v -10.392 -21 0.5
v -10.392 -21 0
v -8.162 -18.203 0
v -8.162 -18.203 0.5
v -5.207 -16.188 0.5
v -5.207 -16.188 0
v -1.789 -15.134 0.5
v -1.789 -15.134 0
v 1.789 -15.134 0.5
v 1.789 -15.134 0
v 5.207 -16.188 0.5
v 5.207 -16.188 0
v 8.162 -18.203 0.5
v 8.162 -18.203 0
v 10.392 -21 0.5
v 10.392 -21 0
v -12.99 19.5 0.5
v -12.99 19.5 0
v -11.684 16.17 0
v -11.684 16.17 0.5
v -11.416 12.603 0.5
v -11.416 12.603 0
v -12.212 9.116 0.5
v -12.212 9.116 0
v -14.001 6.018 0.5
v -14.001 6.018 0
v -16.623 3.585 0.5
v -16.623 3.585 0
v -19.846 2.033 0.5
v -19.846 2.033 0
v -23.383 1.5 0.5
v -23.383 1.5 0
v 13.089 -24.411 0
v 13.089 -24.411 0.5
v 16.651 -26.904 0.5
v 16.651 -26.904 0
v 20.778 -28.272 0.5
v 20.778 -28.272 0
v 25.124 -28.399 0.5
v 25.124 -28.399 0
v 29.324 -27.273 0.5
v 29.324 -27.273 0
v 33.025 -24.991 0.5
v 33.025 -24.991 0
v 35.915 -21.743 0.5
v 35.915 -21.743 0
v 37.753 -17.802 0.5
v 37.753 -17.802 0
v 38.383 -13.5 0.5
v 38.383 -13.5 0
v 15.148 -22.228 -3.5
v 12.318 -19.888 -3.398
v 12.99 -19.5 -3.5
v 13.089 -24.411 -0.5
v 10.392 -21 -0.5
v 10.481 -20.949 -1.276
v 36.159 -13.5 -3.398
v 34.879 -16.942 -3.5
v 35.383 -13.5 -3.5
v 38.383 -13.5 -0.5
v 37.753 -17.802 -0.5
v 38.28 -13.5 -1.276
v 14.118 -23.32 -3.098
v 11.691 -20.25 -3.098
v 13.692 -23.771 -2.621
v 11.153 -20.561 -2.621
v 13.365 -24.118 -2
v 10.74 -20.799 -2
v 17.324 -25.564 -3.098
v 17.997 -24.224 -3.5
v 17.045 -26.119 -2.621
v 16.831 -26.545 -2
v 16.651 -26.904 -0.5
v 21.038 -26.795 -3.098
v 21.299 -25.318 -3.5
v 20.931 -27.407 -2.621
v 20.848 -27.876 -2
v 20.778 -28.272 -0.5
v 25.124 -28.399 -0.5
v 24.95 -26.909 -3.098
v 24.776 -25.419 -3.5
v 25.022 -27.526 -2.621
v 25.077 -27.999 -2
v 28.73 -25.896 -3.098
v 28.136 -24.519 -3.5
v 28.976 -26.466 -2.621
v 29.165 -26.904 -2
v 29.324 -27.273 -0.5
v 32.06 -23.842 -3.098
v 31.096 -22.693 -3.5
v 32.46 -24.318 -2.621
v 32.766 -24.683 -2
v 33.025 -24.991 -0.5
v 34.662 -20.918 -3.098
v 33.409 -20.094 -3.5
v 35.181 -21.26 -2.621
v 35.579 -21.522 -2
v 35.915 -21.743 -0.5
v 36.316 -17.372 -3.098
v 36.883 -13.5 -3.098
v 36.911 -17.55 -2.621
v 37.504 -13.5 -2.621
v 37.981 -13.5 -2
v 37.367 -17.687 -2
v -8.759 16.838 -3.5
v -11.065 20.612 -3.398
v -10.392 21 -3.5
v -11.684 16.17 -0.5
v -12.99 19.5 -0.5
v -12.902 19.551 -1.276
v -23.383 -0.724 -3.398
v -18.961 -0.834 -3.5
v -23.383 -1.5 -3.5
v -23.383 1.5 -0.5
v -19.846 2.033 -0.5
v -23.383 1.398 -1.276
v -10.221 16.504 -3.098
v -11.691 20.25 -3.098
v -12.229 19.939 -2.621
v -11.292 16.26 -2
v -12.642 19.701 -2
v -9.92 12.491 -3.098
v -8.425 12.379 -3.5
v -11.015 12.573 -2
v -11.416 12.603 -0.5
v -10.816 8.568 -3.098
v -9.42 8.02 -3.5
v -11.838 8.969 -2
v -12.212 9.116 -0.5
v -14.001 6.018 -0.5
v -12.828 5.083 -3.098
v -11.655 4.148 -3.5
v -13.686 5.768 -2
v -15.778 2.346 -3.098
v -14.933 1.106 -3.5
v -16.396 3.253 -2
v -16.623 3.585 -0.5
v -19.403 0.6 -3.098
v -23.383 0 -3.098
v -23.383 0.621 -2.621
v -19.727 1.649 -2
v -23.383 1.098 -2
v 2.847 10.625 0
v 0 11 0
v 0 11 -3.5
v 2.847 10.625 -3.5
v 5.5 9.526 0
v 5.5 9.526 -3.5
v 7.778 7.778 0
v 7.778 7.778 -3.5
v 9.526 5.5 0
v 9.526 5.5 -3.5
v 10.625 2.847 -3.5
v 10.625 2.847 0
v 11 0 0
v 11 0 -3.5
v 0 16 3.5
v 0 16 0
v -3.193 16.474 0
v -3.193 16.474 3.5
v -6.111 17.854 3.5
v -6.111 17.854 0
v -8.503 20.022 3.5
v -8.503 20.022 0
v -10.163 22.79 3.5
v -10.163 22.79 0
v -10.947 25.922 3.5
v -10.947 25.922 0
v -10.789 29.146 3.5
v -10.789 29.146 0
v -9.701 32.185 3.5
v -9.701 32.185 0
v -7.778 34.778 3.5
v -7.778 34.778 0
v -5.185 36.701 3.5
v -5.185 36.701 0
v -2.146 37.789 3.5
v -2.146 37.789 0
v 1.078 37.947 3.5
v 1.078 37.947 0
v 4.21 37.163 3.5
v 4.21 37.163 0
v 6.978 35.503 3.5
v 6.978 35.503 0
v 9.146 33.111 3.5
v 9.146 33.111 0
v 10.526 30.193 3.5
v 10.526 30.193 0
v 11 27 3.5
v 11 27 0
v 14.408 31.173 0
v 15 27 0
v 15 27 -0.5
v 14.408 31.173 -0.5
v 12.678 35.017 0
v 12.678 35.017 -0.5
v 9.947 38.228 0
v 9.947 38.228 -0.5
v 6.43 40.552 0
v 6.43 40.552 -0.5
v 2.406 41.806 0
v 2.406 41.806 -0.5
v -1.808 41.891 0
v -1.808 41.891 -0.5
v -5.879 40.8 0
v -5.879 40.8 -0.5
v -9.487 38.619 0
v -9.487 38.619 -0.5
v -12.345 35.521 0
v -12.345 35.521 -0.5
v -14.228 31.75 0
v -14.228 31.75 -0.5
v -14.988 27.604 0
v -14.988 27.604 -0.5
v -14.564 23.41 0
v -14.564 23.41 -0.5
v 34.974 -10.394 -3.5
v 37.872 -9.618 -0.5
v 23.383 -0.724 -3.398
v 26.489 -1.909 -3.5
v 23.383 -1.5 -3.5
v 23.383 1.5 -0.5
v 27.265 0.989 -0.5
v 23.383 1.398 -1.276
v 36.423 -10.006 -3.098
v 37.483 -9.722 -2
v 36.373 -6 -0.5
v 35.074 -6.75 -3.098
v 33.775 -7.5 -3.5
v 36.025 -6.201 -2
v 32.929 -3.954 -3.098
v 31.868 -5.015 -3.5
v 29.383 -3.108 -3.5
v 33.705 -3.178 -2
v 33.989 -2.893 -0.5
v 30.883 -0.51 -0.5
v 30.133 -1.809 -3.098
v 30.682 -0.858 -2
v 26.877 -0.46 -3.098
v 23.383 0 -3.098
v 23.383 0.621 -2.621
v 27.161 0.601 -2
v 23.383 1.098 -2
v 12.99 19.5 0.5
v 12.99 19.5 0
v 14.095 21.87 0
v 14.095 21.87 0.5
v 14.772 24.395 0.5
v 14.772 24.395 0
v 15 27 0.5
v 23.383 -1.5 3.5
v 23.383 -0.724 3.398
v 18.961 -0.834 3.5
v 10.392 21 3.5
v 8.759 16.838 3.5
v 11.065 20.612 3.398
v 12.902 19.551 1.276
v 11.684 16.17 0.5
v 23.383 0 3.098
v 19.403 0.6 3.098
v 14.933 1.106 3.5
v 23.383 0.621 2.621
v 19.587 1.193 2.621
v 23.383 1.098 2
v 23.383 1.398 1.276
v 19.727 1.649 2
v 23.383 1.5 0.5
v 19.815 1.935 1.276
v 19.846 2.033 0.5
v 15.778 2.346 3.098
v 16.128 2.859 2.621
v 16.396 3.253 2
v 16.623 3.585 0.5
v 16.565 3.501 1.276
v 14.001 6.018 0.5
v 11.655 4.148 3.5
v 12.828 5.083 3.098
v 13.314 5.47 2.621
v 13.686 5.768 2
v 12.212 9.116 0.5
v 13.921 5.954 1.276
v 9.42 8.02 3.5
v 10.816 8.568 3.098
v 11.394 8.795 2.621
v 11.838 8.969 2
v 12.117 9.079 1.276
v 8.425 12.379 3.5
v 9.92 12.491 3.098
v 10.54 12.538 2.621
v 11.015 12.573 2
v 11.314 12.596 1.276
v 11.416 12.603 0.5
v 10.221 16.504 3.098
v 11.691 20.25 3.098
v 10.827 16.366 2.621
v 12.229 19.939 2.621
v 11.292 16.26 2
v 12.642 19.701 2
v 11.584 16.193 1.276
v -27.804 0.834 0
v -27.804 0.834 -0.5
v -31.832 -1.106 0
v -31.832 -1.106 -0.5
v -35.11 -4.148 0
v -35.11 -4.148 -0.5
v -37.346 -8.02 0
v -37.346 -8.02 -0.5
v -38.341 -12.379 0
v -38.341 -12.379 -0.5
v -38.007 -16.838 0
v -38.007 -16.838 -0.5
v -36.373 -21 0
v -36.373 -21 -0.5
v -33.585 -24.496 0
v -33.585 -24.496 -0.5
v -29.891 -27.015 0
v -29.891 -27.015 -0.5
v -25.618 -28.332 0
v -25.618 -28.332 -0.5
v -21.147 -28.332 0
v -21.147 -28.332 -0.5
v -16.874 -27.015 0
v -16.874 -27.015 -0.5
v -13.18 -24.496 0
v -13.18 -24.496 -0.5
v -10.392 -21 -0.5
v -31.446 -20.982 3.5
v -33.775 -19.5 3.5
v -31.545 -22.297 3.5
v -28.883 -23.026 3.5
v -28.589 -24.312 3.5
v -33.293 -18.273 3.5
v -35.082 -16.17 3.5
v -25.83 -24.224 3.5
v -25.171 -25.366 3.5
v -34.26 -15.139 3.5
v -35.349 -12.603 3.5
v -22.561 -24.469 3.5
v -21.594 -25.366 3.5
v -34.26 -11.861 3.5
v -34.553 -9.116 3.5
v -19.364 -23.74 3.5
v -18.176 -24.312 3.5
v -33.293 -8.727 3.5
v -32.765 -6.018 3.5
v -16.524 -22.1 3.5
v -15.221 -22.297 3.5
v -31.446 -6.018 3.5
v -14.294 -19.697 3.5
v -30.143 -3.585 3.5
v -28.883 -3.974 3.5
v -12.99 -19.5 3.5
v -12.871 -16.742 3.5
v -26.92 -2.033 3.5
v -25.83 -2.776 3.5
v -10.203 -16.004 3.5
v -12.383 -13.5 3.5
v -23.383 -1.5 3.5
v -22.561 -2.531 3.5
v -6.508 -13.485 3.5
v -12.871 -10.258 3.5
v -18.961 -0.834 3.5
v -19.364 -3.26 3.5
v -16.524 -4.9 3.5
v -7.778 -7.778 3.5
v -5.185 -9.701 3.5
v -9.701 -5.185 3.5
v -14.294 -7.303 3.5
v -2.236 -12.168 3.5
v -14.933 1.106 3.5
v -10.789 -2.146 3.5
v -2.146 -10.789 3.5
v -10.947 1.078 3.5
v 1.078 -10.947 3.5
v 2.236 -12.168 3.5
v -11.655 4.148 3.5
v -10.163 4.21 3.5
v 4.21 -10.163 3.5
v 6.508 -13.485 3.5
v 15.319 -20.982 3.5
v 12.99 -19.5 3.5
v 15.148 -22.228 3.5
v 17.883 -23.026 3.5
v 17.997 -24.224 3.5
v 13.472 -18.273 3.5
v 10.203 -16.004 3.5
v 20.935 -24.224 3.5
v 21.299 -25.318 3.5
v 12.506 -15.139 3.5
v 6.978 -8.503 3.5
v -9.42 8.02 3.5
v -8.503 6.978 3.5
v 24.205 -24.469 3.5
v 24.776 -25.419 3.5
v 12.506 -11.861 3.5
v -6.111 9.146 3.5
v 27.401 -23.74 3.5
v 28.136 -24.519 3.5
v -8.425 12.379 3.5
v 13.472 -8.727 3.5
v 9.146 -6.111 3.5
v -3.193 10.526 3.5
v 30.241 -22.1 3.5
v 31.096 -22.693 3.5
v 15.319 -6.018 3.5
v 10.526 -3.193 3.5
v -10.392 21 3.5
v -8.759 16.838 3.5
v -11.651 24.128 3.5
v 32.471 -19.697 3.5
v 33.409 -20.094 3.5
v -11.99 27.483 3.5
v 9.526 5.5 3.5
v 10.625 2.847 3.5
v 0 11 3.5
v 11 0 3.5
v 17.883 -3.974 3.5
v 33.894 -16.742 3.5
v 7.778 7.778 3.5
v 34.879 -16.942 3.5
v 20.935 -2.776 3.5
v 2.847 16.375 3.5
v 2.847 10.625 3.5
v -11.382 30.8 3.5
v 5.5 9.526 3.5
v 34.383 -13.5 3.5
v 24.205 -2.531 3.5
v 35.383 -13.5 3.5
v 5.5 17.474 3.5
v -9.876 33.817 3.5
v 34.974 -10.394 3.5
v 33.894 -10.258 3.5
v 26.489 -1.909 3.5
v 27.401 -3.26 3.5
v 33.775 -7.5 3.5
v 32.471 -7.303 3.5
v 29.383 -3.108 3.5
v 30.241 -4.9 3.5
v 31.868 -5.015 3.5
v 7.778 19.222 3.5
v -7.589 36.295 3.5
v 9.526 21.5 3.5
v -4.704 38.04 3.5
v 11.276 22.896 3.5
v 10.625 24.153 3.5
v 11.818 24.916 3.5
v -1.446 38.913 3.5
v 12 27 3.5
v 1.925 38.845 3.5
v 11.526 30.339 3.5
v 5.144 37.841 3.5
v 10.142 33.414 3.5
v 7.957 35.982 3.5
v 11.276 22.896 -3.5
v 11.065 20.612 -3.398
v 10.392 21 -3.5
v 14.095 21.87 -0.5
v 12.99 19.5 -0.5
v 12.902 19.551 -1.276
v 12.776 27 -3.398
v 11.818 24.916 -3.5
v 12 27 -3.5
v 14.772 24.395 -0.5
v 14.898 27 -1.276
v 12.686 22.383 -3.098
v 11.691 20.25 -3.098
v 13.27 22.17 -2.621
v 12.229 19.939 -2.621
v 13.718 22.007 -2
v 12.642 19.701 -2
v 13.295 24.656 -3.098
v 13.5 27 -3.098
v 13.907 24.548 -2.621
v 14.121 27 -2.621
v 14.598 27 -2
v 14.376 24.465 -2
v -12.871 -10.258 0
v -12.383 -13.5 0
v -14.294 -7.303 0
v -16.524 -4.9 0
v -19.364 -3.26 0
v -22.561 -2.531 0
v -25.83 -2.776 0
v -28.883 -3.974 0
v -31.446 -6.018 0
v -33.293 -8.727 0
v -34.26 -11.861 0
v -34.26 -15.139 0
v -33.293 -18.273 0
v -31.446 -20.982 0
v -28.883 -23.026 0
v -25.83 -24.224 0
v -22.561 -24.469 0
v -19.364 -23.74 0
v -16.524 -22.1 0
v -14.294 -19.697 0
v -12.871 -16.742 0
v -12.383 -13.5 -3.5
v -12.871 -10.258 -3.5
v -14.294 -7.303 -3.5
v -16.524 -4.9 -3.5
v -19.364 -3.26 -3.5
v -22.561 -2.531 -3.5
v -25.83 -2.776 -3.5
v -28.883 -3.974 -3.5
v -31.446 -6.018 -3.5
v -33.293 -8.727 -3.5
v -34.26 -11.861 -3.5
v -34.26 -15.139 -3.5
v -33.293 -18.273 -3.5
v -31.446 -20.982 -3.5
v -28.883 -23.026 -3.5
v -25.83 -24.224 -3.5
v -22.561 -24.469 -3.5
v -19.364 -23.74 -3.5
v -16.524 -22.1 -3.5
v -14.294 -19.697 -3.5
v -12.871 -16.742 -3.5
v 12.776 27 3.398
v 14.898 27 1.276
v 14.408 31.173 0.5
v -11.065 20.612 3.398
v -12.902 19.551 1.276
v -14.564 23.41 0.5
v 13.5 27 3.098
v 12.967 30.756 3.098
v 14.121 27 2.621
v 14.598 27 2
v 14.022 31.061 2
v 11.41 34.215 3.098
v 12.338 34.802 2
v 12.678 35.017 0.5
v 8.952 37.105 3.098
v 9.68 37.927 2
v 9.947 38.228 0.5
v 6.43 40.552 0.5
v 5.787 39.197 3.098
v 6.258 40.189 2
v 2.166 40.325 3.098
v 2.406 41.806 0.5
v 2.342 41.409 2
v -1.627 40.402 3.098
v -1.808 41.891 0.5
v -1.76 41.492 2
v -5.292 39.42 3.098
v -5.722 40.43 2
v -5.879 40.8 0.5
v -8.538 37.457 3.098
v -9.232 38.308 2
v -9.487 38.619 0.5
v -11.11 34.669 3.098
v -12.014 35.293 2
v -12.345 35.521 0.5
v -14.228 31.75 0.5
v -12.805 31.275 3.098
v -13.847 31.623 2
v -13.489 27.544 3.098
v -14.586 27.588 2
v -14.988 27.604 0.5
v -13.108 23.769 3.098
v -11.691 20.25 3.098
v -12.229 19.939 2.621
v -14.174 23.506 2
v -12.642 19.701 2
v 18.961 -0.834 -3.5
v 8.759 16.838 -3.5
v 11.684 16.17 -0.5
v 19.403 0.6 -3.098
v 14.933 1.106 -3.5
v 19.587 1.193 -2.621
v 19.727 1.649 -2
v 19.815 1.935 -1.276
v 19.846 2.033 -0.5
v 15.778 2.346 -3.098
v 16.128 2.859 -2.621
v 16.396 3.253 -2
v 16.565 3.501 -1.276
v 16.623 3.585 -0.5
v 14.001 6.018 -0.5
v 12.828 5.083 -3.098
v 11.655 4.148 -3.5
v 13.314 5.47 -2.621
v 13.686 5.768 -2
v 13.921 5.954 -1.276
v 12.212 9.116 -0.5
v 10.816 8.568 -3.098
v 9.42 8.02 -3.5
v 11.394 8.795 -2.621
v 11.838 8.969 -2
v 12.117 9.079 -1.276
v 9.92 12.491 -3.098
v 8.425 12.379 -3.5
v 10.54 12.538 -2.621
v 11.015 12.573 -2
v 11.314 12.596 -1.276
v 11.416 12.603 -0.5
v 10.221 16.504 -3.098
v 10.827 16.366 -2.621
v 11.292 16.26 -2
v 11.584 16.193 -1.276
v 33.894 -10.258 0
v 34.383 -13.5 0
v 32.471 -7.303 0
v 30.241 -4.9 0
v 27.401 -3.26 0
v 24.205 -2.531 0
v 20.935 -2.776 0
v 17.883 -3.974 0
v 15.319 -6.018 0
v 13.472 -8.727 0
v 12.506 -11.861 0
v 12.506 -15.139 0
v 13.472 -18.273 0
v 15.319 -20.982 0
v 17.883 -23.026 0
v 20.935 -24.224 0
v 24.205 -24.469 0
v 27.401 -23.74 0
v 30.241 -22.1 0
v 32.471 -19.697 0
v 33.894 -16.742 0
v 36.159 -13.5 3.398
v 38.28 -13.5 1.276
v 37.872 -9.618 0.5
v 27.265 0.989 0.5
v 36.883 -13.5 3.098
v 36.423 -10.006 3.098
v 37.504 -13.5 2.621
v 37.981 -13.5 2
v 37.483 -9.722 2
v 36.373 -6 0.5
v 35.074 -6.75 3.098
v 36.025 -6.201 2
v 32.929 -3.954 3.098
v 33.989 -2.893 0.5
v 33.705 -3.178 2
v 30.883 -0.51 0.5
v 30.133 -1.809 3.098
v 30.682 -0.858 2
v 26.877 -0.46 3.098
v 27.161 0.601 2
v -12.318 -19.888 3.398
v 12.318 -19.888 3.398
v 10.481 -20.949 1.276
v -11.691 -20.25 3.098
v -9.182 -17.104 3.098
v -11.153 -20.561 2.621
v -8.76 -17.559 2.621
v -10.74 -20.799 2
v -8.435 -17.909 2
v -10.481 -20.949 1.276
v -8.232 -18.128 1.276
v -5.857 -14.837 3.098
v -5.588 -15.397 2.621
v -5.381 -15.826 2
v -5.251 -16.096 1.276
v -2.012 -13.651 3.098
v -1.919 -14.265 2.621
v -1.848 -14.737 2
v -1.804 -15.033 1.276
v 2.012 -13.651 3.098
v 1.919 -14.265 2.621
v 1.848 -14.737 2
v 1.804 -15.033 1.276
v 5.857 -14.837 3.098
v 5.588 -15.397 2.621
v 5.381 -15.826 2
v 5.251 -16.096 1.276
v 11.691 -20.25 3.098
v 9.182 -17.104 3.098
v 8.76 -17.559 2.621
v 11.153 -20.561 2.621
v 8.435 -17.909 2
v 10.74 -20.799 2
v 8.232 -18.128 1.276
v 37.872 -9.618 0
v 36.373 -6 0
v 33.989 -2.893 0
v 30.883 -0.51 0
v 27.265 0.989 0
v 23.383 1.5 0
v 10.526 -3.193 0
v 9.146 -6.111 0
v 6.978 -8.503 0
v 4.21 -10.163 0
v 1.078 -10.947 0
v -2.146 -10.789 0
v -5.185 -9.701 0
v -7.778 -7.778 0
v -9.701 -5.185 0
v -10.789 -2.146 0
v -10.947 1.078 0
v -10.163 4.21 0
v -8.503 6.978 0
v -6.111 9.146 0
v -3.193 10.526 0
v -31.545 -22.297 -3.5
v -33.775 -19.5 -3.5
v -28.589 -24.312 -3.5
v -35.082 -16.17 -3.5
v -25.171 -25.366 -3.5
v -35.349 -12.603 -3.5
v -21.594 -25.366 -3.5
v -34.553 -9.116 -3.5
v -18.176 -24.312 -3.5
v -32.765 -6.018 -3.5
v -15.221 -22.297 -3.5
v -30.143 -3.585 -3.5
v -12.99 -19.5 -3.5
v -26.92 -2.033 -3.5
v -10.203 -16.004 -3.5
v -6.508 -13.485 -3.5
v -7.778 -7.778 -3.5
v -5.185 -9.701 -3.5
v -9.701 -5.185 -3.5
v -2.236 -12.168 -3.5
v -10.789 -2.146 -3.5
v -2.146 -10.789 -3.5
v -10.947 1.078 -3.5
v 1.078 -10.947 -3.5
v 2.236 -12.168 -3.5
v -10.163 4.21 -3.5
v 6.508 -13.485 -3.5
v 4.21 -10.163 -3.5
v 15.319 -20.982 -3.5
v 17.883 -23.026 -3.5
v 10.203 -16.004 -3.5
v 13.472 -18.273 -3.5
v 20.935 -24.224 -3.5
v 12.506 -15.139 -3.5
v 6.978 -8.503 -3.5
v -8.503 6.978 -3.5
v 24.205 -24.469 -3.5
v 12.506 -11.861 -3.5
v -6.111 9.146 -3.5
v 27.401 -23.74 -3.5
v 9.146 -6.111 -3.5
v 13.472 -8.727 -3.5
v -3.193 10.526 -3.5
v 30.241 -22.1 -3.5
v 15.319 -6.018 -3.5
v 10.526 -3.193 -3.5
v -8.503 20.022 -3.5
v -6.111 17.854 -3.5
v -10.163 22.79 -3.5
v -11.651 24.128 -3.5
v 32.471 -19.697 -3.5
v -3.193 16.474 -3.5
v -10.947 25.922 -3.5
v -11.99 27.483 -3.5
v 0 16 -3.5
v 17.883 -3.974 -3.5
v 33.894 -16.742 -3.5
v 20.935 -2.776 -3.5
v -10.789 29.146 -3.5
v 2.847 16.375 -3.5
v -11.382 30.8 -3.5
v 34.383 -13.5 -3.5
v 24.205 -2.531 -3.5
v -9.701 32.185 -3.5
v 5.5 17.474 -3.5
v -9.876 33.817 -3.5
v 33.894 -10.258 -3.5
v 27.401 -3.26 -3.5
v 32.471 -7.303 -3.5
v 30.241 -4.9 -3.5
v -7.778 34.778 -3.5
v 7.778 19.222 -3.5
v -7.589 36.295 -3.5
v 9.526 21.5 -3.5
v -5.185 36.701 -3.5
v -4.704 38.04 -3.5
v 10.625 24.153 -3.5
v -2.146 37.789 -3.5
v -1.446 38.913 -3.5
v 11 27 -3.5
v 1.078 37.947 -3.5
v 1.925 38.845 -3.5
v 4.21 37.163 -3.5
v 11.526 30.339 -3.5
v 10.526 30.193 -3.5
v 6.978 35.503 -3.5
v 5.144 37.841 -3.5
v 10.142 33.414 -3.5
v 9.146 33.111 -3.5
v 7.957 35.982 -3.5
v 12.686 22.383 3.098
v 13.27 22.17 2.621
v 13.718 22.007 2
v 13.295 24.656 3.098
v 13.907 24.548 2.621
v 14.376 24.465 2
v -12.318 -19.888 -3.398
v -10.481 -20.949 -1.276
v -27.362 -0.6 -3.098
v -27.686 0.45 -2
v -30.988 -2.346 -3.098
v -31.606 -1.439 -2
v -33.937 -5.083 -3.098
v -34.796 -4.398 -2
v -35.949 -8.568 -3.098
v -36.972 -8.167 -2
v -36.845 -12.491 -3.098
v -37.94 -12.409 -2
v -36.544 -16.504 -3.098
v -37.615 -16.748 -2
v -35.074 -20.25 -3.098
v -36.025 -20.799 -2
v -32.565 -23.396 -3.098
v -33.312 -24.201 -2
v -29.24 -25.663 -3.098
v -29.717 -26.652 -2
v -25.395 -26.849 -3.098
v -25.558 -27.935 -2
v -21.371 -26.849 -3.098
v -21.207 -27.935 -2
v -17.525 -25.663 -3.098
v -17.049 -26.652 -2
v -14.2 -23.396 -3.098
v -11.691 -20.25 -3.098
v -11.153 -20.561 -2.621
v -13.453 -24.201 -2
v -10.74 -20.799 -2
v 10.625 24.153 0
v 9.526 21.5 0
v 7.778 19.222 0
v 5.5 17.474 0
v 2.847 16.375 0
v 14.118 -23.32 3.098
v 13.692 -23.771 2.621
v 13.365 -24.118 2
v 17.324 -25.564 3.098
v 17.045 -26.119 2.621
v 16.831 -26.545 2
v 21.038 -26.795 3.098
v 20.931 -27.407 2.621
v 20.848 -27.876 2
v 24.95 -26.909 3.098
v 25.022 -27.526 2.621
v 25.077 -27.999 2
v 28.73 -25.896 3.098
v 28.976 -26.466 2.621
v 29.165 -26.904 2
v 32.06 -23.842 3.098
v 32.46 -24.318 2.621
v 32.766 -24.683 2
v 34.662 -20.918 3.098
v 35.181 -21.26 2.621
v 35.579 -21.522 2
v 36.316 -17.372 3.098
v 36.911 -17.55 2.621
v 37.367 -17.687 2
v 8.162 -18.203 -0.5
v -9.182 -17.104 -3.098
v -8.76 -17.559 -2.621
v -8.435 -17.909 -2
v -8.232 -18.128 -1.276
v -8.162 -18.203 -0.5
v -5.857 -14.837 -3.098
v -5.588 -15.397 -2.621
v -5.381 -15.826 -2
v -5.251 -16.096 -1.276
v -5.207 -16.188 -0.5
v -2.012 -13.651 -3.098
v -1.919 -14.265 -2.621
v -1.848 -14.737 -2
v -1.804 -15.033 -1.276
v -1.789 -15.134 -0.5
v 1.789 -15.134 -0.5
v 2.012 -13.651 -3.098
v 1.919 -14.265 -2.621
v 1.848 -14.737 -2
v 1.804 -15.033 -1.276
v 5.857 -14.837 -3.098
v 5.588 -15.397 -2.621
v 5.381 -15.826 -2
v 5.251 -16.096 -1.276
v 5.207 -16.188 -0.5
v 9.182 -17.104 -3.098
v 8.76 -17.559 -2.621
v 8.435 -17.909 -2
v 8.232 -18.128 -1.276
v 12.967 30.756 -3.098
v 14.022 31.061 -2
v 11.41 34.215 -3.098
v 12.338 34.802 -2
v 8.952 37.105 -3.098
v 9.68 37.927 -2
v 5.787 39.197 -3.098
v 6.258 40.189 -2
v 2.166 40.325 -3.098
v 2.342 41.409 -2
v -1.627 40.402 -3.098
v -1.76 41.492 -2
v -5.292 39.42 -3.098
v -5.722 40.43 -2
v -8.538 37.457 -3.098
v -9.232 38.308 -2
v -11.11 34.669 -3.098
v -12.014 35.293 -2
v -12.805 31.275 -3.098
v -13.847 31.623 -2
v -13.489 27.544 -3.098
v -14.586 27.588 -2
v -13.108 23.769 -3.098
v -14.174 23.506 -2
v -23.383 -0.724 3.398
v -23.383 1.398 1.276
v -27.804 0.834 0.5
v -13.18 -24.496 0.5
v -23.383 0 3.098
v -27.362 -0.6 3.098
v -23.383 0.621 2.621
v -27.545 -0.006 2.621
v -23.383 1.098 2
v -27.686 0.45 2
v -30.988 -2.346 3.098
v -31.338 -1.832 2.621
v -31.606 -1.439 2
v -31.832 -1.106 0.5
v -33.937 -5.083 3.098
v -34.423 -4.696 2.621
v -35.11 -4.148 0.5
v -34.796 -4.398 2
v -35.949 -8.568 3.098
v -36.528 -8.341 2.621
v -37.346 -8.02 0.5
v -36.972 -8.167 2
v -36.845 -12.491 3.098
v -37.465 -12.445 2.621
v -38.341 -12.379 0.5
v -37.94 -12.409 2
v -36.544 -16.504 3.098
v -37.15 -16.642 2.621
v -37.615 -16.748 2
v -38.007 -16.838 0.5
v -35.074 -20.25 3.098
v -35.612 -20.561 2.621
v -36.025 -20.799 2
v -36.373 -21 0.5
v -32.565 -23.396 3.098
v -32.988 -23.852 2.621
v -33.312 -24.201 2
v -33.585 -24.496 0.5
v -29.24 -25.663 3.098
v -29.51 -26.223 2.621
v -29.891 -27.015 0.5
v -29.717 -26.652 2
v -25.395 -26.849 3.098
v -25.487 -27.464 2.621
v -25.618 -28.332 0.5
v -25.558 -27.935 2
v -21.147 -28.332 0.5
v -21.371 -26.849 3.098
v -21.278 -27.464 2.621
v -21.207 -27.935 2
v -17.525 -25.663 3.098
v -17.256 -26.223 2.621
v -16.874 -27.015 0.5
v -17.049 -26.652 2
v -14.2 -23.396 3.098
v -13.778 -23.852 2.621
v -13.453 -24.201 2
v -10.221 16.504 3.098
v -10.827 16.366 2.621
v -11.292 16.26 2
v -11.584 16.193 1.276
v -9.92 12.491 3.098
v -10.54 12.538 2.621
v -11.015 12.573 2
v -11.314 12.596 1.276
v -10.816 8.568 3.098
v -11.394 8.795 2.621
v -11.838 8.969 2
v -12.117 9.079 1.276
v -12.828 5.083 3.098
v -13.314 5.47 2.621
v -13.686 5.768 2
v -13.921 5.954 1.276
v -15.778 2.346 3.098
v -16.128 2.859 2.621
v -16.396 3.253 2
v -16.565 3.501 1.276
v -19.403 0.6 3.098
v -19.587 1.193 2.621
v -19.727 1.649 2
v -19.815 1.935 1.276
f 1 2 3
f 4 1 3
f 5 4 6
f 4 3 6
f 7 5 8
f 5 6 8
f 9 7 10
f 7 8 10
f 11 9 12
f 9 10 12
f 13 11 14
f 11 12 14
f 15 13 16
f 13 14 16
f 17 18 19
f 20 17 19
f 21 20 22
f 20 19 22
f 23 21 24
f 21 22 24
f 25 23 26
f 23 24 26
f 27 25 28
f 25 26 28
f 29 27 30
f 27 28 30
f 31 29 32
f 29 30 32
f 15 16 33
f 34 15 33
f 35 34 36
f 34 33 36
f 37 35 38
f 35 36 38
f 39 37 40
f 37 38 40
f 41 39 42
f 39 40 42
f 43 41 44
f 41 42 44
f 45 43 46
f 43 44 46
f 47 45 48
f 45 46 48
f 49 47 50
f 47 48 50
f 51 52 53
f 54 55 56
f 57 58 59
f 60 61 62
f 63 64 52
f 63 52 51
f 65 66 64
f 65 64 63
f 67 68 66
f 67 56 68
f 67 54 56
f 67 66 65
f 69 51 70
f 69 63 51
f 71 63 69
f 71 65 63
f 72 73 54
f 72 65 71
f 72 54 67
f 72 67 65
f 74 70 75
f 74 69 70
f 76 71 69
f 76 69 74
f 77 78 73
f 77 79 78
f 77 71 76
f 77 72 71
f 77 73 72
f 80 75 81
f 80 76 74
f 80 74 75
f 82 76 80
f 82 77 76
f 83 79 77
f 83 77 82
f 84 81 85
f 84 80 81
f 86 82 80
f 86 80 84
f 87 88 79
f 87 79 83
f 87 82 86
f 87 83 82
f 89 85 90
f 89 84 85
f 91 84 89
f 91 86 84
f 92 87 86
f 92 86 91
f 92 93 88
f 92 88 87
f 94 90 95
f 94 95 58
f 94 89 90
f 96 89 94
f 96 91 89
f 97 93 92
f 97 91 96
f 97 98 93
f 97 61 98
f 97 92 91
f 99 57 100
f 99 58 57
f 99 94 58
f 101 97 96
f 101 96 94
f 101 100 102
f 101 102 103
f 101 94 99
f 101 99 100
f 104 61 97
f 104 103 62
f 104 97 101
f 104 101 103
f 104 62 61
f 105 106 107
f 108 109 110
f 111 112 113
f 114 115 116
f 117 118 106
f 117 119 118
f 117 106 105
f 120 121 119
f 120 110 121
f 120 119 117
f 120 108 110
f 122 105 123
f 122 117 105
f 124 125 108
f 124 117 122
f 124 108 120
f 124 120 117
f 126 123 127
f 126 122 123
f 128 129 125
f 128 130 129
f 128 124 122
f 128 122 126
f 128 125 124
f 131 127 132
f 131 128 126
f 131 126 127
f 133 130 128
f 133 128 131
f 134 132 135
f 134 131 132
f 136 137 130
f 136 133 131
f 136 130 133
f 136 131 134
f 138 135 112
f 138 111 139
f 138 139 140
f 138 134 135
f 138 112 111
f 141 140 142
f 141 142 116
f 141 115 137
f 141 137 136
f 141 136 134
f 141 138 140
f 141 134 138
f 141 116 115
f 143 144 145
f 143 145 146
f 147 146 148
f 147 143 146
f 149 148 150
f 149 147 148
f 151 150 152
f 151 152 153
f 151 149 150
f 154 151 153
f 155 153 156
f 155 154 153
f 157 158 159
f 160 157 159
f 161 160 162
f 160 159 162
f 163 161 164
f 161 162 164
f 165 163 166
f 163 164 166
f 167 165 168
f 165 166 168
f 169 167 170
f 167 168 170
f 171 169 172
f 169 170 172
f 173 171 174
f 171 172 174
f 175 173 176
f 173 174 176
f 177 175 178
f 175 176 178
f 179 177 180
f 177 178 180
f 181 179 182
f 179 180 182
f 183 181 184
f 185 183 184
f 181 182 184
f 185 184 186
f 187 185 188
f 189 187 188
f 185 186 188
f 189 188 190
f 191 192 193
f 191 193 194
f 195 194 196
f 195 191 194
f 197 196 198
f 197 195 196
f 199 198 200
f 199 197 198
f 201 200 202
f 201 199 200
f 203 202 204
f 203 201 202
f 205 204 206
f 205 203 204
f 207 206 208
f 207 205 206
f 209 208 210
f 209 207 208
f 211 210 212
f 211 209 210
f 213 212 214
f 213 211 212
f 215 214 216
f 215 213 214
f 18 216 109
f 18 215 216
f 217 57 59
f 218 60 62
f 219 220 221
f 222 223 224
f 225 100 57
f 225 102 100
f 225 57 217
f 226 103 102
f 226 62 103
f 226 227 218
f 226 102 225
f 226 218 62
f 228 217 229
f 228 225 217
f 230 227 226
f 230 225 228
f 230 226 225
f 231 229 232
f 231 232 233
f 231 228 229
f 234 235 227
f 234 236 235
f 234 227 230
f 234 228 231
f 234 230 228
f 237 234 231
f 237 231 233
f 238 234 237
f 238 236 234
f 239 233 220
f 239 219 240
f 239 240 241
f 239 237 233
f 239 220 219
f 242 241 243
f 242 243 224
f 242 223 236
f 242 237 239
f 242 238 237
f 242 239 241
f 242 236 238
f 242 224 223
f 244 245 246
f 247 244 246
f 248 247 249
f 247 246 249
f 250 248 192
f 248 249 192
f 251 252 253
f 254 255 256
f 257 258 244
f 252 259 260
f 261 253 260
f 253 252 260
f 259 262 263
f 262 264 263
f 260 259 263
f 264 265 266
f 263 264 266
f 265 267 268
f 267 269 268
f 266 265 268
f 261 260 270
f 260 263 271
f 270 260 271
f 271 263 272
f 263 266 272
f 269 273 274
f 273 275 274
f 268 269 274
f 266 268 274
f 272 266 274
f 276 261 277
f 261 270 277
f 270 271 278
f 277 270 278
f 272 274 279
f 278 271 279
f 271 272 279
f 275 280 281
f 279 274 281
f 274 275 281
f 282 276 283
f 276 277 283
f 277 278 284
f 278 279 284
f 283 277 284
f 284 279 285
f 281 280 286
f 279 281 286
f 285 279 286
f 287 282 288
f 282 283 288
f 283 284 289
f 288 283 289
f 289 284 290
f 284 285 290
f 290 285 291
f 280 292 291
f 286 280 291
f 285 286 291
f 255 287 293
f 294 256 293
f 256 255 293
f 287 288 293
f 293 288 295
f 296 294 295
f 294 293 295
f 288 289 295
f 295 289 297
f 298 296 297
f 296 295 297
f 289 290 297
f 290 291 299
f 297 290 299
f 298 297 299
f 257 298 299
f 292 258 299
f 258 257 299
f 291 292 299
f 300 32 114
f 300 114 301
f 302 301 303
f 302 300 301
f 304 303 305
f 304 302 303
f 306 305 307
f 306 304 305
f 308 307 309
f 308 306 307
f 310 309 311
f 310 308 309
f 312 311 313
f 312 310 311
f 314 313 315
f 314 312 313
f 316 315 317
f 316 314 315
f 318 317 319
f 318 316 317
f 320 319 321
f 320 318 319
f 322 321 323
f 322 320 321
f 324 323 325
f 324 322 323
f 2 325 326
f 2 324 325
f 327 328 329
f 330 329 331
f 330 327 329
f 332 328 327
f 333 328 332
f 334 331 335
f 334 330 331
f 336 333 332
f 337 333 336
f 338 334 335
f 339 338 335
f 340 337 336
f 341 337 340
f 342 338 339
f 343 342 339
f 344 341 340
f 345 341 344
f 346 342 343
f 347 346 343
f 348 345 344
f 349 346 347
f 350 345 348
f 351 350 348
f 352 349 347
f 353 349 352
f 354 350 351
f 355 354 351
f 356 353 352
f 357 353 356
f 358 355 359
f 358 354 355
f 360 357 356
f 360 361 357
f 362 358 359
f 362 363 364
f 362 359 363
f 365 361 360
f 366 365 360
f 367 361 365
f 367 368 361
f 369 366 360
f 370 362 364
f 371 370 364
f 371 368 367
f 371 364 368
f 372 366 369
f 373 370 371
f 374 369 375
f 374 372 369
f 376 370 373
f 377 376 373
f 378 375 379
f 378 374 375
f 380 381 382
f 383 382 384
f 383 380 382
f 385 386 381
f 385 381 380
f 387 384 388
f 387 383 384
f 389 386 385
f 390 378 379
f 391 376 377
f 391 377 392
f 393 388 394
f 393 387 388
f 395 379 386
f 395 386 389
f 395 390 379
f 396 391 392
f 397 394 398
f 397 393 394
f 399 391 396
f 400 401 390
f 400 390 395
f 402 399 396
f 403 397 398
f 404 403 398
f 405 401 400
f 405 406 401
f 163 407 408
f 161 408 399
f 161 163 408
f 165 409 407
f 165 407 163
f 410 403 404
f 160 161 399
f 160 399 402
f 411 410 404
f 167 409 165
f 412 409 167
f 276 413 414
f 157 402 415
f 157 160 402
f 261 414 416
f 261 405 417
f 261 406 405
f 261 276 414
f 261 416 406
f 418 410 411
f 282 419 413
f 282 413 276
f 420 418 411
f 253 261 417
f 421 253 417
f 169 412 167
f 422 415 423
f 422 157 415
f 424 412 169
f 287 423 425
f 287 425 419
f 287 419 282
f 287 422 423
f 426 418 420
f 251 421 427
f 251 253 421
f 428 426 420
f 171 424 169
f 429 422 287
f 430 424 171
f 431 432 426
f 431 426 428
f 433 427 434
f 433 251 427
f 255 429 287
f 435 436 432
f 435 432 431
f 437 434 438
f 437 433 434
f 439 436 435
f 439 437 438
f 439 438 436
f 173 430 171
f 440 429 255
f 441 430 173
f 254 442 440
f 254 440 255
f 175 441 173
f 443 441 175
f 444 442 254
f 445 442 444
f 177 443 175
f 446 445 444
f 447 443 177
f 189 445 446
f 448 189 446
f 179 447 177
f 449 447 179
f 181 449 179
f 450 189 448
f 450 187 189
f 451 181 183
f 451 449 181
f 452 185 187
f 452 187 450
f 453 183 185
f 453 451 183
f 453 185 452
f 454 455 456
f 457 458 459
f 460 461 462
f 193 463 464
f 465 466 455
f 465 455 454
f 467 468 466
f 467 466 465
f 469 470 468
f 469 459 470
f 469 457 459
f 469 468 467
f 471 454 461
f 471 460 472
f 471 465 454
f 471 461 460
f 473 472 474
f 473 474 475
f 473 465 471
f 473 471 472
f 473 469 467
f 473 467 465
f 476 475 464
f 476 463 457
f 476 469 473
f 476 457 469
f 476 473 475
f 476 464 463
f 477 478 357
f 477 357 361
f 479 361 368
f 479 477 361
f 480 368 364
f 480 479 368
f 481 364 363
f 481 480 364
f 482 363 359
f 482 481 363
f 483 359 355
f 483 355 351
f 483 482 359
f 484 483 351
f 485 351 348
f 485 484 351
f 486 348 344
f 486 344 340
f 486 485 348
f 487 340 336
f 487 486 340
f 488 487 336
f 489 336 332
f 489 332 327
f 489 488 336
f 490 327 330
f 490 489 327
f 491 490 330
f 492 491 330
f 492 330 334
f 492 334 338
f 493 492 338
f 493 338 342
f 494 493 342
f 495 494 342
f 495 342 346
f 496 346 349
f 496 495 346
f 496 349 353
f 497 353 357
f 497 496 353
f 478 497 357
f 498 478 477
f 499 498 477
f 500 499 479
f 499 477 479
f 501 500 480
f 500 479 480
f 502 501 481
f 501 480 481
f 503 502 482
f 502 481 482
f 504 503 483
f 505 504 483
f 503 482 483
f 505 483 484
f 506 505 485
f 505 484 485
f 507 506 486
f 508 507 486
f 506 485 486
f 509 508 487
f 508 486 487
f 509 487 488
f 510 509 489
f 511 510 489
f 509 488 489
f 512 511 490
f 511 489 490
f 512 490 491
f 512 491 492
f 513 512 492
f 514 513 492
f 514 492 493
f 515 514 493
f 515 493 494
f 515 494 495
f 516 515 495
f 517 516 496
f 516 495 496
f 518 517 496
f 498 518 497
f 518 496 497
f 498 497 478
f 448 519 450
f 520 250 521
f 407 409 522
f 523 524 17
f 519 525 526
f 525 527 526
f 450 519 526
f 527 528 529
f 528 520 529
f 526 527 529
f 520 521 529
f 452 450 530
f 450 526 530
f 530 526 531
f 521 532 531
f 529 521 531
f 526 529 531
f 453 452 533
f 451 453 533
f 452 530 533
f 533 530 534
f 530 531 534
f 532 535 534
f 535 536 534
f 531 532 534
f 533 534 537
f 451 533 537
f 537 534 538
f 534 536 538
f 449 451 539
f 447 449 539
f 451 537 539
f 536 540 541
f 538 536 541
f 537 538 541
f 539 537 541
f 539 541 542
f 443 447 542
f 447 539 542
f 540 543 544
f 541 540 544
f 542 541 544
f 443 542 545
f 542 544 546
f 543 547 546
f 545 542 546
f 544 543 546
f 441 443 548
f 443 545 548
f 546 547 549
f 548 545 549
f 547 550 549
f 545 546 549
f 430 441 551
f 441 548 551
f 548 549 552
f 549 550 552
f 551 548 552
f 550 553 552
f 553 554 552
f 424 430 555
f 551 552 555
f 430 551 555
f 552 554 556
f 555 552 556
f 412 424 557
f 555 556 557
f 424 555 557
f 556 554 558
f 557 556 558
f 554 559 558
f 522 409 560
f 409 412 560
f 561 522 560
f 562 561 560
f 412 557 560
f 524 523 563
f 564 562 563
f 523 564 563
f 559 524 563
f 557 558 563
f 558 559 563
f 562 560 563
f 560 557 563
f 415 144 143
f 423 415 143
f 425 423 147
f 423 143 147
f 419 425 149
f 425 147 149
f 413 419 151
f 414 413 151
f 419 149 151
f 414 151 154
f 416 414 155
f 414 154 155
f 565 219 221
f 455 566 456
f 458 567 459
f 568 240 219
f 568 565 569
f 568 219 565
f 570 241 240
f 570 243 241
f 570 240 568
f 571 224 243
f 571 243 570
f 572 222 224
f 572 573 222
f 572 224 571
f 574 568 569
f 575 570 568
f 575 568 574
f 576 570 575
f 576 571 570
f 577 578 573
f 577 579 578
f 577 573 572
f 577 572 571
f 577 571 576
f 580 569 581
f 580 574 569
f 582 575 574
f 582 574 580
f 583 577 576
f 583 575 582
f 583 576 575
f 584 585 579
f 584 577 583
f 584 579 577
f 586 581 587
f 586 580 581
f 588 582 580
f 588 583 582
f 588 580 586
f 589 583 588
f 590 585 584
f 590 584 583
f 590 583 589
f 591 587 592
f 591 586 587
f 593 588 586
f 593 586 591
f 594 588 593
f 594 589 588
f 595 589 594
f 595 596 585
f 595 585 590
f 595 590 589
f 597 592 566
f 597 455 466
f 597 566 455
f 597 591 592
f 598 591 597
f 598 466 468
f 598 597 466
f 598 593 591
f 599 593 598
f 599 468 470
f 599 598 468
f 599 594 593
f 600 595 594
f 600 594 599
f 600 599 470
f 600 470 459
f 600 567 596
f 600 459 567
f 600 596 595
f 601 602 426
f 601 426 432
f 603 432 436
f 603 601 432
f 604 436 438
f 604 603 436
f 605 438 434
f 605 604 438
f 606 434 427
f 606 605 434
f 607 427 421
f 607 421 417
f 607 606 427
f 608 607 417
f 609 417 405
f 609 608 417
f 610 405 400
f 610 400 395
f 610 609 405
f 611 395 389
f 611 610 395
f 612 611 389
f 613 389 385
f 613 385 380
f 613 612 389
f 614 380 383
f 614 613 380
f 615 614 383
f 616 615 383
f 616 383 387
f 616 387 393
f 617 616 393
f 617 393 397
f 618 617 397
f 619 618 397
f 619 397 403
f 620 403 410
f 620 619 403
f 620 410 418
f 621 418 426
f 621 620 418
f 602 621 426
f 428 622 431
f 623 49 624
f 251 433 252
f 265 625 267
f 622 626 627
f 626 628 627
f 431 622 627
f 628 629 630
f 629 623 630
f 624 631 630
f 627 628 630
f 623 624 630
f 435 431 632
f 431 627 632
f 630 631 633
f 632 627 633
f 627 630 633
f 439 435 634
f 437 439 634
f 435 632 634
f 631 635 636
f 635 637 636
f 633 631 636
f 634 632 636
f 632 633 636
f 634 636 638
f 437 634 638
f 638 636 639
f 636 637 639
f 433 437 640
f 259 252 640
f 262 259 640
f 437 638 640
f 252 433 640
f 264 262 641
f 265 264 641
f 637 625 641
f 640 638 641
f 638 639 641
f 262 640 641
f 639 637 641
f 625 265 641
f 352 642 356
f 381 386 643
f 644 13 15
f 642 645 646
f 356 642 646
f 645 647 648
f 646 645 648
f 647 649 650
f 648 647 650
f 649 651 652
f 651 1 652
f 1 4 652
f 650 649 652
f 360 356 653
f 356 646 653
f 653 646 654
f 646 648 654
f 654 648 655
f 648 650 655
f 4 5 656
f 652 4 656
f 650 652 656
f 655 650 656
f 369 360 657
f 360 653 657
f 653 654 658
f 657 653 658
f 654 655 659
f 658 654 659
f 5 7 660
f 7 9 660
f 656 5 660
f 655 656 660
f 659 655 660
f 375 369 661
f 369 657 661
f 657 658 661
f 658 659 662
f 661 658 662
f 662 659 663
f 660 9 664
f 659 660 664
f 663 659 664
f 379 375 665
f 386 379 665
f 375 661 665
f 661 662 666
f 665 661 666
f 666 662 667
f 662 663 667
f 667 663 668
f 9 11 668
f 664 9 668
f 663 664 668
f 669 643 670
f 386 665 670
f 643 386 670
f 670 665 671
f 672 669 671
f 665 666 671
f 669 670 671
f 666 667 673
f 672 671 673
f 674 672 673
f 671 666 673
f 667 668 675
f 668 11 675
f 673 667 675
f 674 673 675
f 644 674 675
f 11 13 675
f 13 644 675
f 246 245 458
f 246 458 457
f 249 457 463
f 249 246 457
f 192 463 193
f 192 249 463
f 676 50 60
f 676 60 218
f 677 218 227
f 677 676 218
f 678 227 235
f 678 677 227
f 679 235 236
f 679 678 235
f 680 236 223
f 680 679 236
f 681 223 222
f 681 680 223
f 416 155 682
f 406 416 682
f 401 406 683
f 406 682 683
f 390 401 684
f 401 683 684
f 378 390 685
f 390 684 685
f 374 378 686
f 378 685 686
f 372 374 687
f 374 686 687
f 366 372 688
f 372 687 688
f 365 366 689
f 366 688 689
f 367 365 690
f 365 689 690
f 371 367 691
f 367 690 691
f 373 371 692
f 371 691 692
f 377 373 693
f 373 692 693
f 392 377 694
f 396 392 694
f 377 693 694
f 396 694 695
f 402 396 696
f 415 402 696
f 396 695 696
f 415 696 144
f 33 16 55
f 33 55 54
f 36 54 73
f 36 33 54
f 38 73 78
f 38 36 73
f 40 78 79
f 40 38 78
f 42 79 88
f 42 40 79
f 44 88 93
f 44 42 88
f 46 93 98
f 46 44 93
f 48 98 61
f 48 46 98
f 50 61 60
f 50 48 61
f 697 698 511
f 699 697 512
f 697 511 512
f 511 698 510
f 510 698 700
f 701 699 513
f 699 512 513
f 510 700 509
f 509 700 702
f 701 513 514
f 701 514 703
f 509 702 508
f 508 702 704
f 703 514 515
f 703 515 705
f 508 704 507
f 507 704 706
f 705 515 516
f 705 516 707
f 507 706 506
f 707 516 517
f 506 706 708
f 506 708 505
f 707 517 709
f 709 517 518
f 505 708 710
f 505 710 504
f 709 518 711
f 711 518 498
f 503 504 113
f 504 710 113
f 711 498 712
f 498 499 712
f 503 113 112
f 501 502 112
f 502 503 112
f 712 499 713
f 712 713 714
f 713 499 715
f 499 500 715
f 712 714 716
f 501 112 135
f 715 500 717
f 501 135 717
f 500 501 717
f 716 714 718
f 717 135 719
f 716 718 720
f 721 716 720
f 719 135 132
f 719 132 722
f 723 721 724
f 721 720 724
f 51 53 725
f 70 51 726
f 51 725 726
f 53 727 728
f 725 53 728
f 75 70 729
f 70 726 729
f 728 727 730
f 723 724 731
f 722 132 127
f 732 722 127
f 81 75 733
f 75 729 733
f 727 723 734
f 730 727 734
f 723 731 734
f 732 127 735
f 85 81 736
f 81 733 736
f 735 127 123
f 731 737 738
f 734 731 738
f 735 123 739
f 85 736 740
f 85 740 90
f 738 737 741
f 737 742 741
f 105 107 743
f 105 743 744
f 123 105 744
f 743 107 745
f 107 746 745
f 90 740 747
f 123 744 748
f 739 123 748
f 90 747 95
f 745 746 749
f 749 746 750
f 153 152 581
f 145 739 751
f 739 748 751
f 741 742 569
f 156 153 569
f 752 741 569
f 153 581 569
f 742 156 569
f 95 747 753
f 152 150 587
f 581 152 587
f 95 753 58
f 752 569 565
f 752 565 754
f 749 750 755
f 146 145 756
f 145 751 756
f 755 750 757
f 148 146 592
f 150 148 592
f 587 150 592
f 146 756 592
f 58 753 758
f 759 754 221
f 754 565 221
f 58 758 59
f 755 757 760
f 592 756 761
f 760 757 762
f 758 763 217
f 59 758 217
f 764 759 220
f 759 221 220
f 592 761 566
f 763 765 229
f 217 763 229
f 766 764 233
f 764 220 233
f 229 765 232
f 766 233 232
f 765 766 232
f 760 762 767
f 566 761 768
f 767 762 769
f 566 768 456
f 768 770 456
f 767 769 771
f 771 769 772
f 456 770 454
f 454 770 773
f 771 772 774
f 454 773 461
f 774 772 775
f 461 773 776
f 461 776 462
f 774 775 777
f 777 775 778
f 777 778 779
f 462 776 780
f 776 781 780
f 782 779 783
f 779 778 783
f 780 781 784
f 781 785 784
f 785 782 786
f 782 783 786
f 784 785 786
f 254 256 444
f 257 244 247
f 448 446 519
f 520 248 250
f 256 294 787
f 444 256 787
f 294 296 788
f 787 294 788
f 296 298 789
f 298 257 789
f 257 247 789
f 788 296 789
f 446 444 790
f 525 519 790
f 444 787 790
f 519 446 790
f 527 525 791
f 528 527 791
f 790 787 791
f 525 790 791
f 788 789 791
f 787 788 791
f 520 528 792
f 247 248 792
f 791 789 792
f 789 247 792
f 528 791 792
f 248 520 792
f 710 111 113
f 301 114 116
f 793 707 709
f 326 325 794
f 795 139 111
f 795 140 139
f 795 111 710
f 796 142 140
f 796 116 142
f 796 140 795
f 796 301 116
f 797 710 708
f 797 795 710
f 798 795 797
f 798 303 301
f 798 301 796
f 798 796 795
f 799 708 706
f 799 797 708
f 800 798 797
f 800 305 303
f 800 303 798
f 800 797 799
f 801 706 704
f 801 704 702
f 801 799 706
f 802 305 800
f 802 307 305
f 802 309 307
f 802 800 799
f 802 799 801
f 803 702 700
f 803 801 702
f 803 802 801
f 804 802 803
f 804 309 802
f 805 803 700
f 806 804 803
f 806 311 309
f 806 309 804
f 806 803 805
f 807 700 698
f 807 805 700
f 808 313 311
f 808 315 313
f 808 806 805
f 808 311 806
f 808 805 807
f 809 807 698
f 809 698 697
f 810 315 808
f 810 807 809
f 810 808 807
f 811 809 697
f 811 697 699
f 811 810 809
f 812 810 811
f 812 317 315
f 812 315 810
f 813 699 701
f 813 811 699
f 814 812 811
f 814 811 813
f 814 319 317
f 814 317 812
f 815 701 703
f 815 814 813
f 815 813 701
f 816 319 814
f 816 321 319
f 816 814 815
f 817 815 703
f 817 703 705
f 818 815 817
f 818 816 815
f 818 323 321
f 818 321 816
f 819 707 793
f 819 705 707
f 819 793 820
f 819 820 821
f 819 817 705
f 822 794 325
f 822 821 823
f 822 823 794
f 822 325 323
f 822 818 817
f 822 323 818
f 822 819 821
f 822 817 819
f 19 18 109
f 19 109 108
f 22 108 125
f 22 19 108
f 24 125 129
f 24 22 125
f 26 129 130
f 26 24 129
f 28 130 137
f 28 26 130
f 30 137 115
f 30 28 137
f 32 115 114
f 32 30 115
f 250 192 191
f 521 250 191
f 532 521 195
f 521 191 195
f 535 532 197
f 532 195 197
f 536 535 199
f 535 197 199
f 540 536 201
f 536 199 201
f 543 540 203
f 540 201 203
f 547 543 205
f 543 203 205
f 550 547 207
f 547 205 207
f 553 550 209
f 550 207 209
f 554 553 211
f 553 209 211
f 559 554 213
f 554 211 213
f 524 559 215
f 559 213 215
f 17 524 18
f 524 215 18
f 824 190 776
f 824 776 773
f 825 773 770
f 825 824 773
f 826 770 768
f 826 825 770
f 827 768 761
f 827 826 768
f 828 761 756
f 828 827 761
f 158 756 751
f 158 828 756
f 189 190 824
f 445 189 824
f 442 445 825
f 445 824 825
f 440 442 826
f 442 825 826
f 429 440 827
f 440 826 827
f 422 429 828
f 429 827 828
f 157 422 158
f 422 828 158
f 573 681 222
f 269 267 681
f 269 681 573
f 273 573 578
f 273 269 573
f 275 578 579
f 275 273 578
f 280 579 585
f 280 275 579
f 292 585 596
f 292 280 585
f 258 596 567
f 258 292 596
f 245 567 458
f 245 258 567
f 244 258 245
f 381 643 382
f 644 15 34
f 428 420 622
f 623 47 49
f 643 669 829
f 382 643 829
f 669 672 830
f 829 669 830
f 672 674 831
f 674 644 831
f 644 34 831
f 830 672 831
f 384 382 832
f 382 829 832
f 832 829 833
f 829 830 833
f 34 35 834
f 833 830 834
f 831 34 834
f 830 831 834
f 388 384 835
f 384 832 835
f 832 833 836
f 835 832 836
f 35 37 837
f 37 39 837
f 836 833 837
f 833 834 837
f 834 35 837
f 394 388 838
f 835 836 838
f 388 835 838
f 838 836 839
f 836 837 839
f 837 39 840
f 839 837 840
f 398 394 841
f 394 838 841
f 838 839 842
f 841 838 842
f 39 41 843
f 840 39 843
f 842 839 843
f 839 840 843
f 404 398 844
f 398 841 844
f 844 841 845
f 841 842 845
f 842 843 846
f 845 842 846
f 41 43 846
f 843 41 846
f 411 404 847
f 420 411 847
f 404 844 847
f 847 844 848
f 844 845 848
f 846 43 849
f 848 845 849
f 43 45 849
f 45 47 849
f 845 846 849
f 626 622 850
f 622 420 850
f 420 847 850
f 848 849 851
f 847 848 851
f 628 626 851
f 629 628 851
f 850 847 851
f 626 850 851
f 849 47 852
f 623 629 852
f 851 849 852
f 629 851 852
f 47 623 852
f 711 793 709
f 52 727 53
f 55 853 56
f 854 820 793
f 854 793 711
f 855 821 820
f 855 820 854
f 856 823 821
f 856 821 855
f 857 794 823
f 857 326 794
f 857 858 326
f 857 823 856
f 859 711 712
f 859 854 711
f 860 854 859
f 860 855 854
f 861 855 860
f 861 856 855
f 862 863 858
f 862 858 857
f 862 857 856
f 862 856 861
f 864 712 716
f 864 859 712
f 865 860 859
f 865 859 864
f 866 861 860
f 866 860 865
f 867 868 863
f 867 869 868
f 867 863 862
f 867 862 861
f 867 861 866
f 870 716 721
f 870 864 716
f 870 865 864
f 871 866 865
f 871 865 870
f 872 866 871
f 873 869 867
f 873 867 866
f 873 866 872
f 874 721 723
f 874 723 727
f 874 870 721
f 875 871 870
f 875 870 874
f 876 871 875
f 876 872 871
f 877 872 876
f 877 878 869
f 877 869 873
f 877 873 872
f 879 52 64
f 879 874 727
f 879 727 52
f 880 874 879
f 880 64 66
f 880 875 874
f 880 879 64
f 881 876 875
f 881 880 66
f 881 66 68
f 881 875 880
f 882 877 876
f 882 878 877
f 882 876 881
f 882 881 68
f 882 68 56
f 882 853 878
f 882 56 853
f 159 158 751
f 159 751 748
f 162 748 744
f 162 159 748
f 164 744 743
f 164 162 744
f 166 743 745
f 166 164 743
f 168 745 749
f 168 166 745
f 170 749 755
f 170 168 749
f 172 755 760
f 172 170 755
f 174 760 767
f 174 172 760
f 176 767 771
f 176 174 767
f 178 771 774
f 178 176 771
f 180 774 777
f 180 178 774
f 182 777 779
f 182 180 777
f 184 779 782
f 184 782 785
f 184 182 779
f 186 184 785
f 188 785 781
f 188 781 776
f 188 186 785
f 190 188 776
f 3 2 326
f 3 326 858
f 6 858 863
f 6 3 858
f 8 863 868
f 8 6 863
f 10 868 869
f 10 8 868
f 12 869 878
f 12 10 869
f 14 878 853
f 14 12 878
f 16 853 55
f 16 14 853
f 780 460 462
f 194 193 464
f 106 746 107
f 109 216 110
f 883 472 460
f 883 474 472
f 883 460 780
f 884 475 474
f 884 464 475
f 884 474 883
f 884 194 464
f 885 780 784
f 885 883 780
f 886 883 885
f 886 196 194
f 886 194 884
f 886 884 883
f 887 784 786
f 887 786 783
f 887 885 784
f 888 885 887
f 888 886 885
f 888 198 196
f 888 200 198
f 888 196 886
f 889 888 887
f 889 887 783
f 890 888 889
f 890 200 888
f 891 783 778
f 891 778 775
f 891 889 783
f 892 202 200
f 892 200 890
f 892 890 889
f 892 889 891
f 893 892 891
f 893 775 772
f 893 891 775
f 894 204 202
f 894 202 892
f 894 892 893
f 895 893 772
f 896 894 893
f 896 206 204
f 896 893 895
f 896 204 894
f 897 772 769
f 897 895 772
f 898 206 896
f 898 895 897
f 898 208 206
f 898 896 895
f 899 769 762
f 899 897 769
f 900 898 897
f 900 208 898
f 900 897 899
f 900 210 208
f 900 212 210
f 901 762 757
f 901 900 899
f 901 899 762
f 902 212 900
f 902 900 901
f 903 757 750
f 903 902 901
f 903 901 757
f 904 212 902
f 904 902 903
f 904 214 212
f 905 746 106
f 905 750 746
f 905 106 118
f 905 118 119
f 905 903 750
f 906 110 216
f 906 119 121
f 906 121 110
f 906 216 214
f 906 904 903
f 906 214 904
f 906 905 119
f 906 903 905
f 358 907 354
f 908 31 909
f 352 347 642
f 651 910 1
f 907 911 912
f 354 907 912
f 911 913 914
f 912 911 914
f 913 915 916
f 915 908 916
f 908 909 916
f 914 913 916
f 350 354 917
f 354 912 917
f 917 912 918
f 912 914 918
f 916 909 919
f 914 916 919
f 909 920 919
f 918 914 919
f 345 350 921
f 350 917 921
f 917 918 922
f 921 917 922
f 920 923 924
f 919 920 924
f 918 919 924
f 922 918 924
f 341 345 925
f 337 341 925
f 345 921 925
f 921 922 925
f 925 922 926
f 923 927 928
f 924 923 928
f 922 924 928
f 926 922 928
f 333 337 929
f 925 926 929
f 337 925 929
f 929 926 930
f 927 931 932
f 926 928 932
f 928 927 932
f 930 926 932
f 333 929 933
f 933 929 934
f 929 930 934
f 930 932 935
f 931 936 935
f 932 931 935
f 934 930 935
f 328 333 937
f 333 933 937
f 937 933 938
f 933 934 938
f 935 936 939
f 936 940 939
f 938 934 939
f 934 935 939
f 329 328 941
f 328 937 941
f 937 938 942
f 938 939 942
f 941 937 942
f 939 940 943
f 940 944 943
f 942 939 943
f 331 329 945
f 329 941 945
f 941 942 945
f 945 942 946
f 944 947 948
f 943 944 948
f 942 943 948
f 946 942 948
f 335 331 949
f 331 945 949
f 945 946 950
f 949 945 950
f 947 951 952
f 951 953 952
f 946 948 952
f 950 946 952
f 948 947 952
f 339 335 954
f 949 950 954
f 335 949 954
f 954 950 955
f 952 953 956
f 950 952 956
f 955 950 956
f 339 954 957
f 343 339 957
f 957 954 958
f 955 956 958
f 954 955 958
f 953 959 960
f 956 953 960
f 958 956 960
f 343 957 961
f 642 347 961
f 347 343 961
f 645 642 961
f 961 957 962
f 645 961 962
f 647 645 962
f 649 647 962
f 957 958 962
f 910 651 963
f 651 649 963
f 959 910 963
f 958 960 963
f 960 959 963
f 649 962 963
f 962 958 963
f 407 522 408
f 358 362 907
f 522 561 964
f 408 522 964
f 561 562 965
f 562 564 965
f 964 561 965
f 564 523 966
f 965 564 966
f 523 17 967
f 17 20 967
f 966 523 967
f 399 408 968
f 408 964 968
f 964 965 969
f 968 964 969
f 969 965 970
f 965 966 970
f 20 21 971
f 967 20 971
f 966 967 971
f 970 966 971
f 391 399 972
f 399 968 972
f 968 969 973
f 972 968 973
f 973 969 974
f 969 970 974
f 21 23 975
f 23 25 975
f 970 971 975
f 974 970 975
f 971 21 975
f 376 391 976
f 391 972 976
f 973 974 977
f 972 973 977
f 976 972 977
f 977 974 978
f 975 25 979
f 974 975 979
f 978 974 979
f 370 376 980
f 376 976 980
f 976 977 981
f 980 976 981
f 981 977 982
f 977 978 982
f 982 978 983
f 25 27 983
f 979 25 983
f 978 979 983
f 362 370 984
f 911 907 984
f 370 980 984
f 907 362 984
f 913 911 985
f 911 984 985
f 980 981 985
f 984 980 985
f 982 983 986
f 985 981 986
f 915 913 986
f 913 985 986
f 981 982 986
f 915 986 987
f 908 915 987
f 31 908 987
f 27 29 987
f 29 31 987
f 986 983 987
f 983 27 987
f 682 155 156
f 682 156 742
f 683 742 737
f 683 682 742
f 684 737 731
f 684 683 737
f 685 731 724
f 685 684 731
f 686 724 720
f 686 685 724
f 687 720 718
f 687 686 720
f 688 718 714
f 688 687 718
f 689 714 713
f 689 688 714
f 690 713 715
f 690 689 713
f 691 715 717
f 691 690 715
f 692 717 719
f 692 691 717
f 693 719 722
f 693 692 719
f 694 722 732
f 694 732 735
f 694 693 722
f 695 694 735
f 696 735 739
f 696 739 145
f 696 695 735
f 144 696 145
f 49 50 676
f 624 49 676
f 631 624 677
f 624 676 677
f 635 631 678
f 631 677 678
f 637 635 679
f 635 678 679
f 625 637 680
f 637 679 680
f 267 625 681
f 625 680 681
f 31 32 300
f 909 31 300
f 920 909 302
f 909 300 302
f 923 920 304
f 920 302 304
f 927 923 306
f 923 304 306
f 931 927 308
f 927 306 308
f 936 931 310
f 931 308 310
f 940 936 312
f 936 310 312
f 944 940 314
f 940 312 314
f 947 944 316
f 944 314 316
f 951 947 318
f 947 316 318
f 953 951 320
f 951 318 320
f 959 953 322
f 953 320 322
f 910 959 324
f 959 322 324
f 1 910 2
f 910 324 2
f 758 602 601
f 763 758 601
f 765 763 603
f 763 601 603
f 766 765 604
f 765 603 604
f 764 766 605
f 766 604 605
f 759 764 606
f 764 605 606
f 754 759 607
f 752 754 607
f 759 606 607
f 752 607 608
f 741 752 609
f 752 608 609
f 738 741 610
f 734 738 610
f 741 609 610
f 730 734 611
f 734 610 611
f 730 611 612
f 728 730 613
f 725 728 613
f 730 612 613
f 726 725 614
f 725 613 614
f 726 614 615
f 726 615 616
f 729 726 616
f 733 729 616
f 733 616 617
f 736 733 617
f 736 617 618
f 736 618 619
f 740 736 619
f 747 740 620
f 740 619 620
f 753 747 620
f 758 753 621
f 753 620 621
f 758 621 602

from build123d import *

# Parameters (mm, degrees)
F0_R     = 11
F1_DEPTH = 3.5
F2_R     = 3


with BuildPart() as f1:
    # F0 (on Top) → F1 (new body, symmetric)
    with BuildSketch(Plane.XY):
        with BuildLine():
            ThreePointArc((12.9903810568, 19.5), (7.5, 14.0096189432), (0, 12))
            ThreePointArc((0, 12), (-7.5, 14.0096189432), (-12.9903810568, 19.5))
            ThreePointArc((-12.9903810568, 19.5), (-12.9903810568, 7.5), (-23.3826859022, 1.5))
            ThreePointArc((-23.3826859022, 1.5), (-12.7760841844, -2.8933982822), (-8.3826859022, -13.5))
            ThreePointArc((-8.3826859022, -13.5), (-8.8937985078, -17.3822856765), (-10.3923048454, -21))
            ThreePointArc((-10.3923048454, -21), (0, -15), (10.3923048454, -21))
            ThreePointArc((10.3923048454, -21), (10.3923048454, -6), (23.3826859022, 1.5))
            ThreePointArc((23.3826859022, 1.5), (12.9903810568, 7.5), (12.9903810568, 19.5))
        make_face()
        with BuildLine():
            ThreePointArc((0, 11), (7.7781745931, 7.7781745931), (11, 0))
            ThreePointArc((11, 0), (-7.7781745931, -7.7781745931), (0, 11))
        make_face(mode=Mode.SUBTRACT)
        with BuildLine():
            ThreePointArc((-12.9903810568, 19.5), (-7.5, 14.0096189432), (0, 12))
            ThreePointArc((0, 12), (7.5, 14.0096189432), (12.9903810568, 19.5))
            ThreePointArc((12.9903810568, 19.5), (14.4888873943, 23.1177143235), (15, 27))
            ThreePointArc((15, 27), (-3.8822856765, 41.4888873943), (-12.9903810568, 19.5))
        make_face()
        with BuildLine():
            ThreePointArc((11, 27), (7.7781745931, 19.2218254069), (0, 16))
            ThreePointArc((0, 16), (-7.7781745931, 34.7781745931), (11, 27))
        make_face(mode=Mode.SUBTRACT)
        with BuildLine():
            ThreePointArc((-8.3826859022, -13.5), (-12.7760841844, -2.8933982822), (-23.3826859022, 1.5))
            ThreePointArc((-23.3826859022, 1.5), (-36.3730669589, -21), (-10.3923048454, -21))
            ThreePointArc((-10.3923048454, -21), (-8.8937985078, -17.3822856765), (-8.3826859022, -13.5))
        make_face()
        with Locations((-23.3826859022, -13.5)):
            Circle(F0_R, mode=Mode.SUBTRACT)
        with BuildLine():
            ThreePointArc((38.3826859022, -13.5), (33.98928762, -2.8933982822), (23.3826859022, 1.5))
            ThreePointArc((23.3826859022, 1.5), (10.3923048454, -6), (10.3923048454, -21))
            ThreePointArc((10.3923048454, -21), (27.2649715787, -27.9888873943), (38.3826859022, -13.5))
        make_face()
        with Locations((23.3826859022, -13.5)):
            Circle(F0_R, mode=Mode.SUBTRACT)
    extrude(amount=F1_DEPTH, both=True)

    # F2
    f2_edges = [f1.edges().sort_by_distance(p)[0] for p in [
        (0, 42, 3.5),
        (-36.373067, -21, -3.5),
    ]]
    fillet(f2_edges, radius=F2_R)


solid = f1.part
